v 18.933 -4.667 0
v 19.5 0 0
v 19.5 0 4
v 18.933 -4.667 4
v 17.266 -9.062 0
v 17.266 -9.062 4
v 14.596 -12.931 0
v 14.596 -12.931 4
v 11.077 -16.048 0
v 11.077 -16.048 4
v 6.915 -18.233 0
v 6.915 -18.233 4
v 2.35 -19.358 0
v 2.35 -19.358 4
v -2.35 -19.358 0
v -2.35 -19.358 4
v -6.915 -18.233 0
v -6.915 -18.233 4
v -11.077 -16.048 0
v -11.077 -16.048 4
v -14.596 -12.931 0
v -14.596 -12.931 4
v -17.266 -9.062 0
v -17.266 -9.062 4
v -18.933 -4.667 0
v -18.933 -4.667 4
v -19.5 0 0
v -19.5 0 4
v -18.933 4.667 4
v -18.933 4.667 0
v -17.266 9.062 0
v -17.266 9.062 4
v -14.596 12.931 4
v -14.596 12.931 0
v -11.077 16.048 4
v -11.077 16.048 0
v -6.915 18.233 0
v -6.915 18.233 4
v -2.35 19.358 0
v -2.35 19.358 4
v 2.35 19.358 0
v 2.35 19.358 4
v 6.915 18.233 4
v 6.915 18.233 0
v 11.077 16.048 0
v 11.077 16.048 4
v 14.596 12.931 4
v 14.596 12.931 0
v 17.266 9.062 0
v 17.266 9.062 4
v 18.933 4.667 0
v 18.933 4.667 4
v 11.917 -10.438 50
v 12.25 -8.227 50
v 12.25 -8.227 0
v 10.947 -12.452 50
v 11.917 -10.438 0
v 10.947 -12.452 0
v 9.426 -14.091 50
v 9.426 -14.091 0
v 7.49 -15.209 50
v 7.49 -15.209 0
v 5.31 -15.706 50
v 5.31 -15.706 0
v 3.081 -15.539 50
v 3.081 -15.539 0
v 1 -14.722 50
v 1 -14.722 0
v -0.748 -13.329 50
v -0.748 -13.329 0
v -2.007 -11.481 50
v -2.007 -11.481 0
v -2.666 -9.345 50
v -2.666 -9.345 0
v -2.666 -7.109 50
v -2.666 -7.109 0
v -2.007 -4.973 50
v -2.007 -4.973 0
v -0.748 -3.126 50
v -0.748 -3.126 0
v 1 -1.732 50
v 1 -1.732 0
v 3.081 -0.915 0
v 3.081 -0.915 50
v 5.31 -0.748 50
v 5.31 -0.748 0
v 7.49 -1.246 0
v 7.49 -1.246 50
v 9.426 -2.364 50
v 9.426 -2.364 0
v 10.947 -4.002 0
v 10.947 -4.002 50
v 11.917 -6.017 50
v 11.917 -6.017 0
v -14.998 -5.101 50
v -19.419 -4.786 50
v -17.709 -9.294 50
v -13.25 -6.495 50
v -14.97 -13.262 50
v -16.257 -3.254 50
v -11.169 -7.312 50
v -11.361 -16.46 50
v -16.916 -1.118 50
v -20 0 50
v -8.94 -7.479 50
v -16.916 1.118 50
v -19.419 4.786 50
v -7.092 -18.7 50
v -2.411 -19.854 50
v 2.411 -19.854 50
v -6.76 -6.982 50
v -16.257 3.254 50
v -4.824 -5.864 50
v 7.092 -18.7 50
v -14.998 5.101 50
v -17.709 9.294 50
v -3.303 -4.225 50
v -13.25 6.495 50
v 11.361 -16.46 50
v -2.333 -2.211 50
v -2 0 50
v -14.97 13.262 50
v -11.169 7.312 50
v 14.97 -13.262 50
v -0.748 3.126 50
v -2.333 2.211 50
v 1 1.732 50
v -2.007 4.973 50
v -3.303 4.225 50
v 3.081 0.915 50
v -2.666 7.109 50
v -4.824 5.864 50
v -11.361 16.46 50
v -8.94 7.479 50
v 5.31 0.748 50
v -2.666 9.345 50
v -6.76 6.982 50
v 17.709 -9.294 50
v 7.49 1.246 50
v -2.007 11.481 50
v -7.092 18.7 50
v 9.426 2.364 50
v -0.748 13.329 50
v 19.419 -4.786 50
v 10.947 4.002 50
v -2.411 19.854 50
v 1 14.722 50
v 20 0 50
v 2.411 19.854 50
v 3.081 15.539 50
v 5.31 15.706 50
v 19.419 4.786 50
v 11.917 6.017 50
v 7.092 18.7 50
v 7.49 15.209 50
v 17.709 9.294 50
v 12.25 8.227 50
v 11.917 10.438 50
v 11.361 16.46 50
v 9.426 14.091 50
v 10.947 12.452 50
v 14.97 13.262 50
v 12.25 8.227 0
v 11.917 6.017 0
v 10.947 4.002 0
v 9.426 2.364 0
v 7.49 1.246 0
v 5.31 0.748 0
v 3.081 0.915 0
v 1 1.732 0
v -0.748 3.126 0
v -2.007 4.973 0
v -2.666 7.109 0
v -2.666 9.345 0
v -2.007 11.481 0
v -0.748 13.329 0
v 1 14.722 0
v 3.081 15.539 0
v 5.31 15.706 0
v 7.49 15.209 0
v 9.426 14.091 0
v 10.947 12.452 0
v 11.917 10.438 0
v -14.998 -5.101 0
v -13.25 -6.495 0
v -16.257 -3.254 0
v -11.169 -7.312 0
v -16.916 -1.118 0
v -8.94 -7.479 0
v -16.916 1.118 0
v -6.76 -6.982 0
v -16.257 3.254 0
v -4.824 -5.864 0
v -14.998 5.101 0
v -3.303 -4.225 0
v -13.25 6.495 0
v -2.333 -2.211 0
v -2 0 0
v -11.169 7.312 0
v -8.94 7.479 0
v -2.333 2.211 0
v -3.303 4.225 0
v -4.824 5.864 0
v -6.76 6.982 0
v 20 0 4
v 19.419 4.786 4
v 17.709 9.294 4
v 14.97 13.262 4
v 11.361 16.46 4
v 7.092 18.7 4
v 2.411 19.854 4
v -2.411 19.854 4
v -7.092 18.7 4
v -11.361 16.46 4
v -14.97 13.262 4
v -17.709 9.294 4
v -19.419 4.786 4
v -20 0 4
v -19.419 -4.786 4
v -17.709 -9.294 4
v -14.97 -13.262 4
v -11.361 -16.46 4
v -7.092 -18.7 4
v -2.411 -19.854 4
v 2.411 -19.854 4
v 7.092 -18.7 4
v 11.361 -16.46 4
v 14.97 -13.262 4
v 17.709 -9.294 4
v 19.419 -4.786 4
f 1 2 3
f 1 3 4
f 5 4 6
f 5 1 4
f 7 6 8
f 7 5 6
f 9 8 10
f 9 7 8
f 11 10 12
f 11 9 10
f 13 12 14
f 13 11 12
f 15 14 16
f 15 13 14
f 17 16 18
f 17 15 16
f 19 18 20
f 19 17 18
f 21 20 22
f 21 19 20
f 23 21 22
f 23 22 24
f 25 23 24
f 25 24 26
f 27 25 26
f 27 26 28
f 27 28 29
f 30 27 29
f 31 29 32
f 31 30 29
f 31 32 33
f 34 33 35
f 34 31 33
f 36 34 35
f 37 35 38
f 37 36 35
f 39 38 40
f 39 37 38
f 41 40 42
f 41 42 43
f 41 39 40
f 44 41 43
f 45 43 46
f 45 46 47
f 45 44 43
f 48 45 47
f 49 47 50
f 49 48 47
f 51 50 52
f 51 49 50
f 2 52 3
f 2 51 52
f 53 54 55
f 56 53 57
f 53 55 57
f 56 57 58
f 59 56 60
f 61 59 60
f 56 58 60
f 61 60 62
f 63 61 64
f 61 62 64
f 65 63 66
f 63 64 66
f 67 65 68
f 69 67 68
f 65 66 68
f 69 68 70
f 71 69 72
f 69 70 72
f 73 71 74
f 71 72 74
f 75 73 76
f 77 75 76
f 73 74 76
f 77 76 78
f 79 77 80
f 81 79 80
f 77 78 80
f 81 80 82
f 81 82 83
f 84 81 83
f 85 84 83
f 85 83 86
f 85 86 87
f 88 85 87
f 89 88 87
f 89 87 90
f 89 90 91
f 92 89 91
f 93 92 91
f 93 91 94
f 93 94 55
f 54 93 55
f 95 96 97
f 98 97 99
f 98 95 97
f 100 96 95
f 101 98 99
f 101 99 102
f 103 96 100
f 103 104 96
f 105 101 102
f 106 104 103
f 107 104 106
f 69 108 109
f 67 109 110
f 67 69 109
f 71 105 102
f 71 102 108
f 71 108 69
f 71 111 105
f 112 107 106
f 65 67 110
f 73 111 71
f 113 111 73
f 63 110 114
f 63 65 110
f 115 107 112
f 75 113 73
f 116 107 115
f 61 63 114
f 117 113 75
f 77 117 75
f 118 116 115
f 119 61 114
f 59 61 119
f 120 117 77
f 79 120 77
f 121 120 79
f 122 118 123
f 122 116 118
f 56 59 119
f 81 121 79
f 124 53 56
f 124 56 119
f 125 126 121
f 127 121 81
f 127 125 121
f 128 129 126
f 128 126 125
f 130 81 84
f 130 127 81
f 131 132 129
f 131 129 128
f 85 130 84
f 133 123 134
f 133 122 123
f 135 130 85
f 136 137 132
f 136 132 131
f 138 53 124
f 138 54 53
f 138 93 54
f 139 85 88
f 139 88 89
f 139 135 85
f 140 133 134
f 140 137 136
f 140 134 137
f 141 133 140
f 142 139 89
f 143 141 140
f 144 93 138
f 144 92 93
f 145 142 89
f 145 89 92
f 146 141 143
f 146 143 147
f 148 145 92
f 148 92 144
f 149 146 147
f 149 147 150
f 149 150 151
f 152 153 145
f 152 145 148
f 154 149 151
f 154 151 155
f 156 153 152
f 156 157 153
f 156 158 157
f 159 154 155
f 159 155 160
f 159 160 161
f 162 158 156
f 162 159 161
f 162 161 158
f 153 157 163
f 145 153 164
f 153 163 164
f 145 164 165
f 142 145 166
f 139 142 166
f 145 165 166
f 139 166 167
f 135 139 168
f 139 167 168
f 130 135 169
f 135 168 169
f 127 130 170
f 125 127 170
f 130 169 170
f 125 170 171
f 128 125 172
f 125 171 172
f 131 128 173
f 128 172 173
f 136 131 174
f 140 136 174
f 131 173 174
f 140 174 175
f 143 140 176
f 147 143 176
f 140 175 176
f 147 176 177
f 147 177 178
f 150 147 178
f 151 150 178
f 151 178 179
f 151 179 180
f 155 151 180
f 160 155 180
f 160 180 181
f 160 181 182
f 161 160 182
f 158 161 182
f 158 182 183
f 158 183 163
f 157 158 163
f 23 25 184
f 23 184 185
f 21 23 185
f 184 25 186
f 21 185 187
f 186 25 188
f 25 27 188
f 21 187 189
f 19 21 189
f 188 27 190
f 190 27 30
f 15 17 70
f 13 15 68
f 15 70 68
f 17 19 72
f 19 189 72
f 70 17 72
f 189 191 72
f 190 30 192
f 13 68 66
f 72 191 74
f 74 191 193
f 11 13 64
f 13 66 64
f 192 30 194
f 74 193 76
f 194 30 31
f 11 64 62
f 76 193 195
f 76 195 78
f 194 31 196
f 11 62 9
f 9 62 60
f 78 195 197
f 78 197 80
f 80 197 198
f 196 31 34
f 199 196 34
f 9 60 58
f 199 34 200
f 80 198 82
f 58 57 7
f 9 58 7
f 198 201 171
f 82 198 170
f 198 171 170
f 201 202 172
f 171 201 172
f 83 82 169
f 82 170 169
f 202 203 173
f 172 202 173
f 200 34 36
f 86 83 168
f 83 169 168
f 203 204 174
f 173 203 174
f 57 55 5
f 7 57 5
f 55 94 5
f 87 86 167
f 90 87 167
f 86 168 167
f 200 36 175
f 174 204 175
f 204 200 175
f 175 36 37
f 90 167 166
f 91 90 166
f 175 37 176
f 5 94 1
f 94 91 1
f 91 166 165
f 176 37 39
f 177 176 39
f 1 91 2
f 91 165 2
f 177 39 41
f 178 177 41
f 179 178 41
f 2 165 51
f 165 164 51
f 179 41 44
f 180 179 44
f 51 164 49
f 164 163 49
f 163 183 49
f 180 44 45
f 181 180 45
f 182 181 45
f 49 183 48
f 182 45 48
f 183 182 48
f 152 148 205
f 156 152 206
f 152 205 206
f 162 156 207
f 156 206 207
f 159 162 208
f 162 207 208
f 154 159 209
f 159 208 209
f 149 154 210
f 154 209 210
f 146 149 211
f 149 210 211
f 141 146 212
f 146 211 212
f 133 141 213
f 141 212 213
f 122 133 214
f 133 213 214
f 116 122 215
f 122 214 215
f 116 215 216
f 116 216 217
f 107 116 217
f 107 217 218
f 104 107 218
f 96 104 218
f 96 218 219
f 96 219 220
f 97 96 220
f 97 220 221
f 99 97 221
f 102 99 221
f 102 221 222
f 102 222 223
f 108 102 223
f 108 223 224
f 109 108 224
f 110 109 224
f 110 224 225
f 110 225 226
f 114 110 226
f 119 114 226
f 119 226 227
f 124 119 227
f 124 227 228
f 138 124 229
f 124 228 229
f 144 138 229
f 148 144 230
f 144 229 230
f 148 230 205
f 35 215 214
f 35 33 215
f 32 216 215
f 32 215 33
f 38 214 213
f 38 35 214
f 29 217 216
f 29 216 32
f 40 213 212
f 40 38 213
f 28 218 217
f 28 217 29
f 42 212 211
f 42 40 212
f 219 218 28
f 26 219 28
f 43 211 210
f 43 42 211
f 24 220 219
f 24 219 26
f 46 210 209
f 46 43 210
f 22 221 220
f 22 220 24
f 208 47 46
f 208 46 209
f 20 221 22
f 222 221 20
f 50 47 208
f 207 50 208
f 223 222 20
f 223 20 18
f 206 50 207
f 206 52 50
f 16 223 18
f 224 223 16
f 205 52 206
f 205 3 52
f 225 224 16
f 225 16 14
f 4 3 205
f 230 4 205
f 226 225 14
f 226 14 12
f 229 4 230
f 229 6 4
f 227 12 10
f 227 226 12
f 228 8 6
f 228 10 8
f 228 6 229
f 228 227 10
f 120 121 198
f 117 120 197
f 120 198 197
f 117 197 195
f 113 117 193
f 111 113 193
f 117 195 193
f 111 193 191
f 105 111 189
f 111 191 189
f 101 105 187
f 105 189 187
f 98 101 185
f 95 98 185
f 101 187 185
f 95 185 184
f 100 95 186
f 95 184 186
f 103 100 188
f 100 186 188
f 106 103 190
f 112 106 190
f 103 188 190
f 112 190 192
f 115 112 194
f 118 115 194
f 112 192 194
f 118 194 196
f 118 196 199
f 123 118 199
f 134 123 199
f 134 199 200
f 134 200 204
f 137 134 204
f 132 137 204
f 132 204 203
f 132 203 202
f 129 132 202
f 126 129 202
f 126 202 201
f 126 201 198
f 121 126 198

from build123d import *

# Parameters (mm, degrees)
F0_R     = 20
F1_DEPTH = 50
F2_R     = 7.5
F3_DEPTH = 50.001
F4_R     = 20
F4_R_2   = 19.5
F5_DEPTH = 4


with BuildPart() as f1:
    # F0 (on Top) → F1 (new body)
    with BuildSketch(Plane.XY):
        Circle(F0_R)
    extrude(amount=F1_DEPTH)

    # F2 (on face) → F3 (cut, through all)
    with BuildSketch(Plane(origin=(0, 0, 0), x_dir=(1, 0, 0), z_dir=(0, 0, -1))):
        with Locations((-9.5, 0)):
            Circle(F2_R)
        with Locations((4.75, -8.227241)):
            Circle(F2_R)
        with Locations((4.75, 8.227241)):
            Circle(F2_R)
    extrude(amount=-F3_DEPTH, mode=Mode.SUBTRACT)

    # F4 (on face) → F5 (cut)
    with BuildSketch(Plane(origin=(0, 0, 0), x_dir=(1, 0, 0), z_dir=(0, 0, -1))):
        Circle(F4_R)
        Circle(F4_R_2, mode=Mode.SUBTRACT)
    extrude(amount=-F5_DEPTH, mode=Mode.SUBTRACT)


solid = f1.part
